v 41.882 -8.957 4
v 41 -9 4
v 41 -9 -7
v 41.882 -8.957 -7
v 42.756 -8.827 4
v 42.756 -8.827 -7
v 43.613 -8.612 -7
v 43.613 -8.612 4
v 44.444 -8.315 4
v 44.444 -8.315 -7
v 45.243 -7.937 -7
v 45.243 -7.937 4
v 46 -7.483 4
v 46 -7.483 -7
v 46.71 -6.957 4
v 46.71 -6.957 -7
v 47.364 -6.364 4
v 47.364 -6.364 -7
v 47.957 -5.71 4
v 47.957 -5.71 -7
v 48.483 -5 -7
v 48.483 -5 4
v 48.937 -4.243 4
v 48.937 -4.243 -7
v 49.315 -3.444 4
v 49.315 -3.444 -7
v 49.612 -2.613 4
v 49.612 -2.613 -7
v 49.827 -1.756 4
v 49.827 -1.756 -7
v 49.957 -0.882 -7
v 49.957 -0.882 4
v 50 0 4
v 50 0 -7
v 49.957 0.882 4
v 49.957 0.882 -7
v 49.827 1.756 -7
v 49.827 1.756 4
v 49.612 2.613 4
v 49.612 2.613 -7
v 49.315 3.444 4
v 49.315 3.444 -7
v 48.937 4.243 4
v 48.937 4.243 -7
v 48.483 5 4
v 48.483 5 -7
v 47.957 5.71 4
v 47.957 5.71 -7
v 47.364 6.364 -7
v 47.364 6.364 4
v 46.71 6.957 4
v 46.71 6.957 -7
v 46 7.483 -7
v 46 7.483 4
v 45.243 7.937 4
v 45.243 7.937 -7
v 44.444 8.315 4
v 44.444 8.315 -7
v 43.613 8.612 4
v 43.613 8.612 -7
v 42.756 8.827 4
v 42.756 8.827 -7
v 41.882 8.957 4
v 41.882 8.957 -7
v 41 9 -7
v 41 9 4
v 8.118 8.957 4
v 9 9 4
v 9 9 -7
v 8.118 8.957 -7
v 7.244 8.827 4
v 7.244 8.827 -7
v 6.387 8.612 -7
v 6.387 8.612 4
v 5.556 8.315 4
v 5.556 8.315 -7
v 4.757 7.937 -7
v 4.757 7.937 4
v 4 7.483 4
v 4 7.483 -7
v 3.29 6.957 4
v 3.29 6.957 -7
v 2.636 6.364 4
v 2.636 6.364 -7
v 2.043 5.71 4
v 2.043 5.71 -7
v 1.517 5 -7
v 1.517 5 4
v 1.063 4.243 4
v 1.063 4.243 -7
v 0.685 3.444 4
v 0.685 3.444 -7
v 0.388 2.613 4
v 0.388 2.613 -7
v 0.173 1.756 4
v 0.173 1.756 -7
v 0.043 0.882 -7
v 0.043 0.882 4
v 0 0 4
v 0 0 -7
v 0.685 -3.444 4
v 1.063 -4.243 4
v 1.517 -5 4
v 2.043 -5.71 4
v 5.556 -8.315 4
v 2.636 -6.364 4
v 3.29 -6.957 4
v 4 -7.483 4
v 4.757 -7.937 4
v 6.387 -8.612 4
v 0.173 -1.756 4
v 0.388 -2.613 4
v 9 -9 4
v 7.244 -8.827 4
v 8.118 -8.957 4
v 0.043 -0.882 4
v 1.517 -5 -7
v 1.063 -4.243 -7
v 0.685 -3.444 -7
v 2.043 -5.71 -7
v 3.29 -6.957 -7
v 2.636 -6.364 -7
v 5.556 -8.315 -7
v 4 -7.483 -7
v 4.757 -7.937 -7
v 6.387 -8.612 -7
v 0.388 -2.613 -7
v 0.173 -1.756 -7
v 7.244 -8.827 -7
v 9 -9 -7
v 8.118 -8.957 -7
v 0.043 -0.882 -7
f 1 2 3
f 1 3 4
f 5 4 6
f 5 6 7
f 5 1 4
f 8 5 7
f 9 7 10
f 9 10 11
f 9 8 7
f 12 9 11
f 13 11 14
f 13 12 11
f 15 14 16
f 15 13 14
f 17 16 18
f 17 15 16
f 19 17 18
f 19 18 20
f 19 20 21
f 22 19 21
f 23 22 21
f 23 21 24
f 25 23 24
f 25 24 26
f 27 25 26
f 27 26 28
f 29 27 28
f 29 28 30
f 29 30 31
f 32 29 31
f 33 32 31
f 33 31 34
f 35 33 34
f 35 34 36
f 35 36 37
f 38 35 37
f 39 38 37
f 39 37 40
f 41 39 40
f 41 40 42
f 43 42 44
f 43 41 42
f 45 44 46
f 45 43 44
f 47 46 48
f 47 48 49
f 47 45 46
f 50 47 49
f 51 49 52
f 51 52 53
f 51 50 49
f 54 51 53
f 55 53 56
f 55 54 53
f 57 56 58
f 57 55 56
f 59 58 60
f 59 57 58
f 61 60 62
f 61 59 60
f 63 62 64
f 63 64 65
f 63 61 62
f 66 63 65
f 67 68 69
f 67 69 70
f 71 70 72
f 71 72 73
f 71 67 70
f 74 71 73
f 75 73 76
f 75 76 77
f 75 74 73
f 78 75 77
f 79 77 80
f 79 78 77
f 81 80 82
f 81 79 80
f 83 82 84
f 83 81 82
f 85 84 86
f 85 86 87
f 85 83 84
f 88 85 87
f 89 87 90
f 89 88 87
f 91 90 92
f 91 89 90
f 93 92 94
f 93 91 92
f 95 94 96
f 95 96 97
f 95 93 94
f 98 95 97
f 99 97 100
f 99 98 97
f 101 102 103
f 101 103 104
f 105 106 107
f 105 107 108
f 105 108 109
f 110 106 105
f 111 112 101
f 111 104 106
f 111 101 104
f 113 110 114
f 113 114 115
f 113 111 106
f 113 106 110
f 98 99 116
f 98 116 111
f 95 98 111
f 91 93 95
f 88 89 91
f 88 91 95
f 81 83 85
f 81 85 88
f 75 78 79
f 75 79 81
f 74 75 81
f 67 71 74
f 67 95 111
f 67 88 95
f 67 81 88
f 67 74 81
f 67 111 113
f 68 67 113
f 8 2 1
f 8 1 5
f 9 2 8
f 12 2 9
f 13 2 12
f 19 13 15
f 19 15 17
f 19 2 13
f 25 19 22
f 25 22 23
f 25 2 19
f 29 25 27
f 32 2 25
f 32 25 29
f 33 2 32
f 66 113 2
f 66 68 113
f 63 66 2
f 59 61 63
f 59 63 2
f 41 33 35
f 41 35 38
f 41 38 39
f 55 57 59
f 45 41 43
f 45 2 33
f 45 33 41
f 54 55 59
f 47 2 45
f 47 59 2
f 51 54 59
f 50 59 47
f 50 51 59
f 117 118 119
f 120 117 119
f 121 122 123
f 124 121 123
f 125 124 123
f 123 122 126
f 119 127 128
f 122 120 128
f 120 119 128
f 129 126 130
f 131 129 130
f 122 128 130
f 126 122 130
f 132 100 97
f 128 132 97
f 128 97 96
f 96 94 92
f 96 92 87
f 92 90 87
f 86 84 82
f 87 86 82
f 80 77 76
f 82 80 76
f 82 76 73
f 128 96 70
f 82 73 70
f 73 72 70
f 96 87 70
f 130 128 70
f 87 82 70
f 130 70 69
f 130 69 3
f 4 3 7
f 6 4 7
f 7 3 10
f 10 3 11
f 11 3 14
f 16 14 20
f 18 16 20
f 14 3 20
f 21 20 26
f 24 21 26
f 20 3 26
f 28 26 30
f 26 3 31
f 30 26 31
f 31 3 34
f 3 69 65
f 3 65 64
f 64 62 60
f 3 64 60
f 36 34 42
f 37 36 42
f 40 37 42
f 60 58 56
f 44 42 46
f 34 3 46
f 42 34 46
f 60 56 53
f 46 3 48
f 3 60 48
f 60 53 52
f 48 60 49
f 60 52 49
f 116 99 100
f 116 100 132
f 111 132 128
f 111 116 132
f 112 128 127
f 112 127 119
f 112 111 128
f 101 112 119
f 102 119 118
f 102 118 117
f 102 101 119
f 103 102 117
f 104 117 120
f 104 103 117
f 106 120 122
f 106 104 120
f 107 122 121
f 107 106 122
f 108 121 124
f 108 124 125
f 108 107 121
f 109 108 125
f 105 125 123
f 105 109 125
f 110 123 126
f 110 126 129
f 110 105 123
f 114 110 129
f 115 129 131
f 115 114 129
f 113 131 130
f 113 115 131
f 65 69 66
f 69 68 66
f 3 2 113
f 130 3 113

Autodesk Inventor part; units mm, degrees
sketch "草图1" plane through (0, 0, 0) normal (0, 0, 1) x (1, 0, 0)
  line L0 (9, 9) -> (41, 9)
  line L1 (41, -9) -> (9, -9)
  arc A0 (9, 9) -> (9, -9) centre (9, 0) ccw
  line L2 (0, 9.4) -> (0, -7.4) projected
  line L3 (-5, 0) -> (30, 0) projected
  arc A1 (41, -9) -> (41, 9) centre (41, 0) ccw
  line L4 (50, 0) -> (50, 7) construction
  dimension "d0" = 9
  dimension "d8" = 9
  dimension "d9" = 50
ref_plane "Work Plane1" through (0, 0, -7) normal (0, 0, 1) x (1, 0, 0)
ref_plane "Work Plane2" through (0, 0, 4) normal (0, 0, 1) x (1, 0, 0)
extrude "轴承体1" add sketch "草图1" against normal up to surface (11 mm away) from surface at 4
ref_plane "Work Plane3" through (50, 0, 4) normal (1, 0, 0) x (0, 1, 0)
equation "\"d0\" = 0.5 * PB"
equation "\"d8\" = 0.5 * PB"
equation "\"d9\" = NLG"
equation "\"d1\" = -PNT"
equation "\"d2\" = PH - PNT"
equation "\"NLG\" = 50"
equation "\"PB\" = 18"
equation "\"PNT\" = 7"
equation "\"PH\" = 11"
equation "\"RR\" = 0.001"
equation "\"WDMIN\" = 58"
equation "\"PHH\" = 0"
equation "\"WDMAX\" = 65"
equation "\"PUEB\" = 4.4"
properties part number "DIN 6885 - A 18 x 11 x 50" material "钢，软"
